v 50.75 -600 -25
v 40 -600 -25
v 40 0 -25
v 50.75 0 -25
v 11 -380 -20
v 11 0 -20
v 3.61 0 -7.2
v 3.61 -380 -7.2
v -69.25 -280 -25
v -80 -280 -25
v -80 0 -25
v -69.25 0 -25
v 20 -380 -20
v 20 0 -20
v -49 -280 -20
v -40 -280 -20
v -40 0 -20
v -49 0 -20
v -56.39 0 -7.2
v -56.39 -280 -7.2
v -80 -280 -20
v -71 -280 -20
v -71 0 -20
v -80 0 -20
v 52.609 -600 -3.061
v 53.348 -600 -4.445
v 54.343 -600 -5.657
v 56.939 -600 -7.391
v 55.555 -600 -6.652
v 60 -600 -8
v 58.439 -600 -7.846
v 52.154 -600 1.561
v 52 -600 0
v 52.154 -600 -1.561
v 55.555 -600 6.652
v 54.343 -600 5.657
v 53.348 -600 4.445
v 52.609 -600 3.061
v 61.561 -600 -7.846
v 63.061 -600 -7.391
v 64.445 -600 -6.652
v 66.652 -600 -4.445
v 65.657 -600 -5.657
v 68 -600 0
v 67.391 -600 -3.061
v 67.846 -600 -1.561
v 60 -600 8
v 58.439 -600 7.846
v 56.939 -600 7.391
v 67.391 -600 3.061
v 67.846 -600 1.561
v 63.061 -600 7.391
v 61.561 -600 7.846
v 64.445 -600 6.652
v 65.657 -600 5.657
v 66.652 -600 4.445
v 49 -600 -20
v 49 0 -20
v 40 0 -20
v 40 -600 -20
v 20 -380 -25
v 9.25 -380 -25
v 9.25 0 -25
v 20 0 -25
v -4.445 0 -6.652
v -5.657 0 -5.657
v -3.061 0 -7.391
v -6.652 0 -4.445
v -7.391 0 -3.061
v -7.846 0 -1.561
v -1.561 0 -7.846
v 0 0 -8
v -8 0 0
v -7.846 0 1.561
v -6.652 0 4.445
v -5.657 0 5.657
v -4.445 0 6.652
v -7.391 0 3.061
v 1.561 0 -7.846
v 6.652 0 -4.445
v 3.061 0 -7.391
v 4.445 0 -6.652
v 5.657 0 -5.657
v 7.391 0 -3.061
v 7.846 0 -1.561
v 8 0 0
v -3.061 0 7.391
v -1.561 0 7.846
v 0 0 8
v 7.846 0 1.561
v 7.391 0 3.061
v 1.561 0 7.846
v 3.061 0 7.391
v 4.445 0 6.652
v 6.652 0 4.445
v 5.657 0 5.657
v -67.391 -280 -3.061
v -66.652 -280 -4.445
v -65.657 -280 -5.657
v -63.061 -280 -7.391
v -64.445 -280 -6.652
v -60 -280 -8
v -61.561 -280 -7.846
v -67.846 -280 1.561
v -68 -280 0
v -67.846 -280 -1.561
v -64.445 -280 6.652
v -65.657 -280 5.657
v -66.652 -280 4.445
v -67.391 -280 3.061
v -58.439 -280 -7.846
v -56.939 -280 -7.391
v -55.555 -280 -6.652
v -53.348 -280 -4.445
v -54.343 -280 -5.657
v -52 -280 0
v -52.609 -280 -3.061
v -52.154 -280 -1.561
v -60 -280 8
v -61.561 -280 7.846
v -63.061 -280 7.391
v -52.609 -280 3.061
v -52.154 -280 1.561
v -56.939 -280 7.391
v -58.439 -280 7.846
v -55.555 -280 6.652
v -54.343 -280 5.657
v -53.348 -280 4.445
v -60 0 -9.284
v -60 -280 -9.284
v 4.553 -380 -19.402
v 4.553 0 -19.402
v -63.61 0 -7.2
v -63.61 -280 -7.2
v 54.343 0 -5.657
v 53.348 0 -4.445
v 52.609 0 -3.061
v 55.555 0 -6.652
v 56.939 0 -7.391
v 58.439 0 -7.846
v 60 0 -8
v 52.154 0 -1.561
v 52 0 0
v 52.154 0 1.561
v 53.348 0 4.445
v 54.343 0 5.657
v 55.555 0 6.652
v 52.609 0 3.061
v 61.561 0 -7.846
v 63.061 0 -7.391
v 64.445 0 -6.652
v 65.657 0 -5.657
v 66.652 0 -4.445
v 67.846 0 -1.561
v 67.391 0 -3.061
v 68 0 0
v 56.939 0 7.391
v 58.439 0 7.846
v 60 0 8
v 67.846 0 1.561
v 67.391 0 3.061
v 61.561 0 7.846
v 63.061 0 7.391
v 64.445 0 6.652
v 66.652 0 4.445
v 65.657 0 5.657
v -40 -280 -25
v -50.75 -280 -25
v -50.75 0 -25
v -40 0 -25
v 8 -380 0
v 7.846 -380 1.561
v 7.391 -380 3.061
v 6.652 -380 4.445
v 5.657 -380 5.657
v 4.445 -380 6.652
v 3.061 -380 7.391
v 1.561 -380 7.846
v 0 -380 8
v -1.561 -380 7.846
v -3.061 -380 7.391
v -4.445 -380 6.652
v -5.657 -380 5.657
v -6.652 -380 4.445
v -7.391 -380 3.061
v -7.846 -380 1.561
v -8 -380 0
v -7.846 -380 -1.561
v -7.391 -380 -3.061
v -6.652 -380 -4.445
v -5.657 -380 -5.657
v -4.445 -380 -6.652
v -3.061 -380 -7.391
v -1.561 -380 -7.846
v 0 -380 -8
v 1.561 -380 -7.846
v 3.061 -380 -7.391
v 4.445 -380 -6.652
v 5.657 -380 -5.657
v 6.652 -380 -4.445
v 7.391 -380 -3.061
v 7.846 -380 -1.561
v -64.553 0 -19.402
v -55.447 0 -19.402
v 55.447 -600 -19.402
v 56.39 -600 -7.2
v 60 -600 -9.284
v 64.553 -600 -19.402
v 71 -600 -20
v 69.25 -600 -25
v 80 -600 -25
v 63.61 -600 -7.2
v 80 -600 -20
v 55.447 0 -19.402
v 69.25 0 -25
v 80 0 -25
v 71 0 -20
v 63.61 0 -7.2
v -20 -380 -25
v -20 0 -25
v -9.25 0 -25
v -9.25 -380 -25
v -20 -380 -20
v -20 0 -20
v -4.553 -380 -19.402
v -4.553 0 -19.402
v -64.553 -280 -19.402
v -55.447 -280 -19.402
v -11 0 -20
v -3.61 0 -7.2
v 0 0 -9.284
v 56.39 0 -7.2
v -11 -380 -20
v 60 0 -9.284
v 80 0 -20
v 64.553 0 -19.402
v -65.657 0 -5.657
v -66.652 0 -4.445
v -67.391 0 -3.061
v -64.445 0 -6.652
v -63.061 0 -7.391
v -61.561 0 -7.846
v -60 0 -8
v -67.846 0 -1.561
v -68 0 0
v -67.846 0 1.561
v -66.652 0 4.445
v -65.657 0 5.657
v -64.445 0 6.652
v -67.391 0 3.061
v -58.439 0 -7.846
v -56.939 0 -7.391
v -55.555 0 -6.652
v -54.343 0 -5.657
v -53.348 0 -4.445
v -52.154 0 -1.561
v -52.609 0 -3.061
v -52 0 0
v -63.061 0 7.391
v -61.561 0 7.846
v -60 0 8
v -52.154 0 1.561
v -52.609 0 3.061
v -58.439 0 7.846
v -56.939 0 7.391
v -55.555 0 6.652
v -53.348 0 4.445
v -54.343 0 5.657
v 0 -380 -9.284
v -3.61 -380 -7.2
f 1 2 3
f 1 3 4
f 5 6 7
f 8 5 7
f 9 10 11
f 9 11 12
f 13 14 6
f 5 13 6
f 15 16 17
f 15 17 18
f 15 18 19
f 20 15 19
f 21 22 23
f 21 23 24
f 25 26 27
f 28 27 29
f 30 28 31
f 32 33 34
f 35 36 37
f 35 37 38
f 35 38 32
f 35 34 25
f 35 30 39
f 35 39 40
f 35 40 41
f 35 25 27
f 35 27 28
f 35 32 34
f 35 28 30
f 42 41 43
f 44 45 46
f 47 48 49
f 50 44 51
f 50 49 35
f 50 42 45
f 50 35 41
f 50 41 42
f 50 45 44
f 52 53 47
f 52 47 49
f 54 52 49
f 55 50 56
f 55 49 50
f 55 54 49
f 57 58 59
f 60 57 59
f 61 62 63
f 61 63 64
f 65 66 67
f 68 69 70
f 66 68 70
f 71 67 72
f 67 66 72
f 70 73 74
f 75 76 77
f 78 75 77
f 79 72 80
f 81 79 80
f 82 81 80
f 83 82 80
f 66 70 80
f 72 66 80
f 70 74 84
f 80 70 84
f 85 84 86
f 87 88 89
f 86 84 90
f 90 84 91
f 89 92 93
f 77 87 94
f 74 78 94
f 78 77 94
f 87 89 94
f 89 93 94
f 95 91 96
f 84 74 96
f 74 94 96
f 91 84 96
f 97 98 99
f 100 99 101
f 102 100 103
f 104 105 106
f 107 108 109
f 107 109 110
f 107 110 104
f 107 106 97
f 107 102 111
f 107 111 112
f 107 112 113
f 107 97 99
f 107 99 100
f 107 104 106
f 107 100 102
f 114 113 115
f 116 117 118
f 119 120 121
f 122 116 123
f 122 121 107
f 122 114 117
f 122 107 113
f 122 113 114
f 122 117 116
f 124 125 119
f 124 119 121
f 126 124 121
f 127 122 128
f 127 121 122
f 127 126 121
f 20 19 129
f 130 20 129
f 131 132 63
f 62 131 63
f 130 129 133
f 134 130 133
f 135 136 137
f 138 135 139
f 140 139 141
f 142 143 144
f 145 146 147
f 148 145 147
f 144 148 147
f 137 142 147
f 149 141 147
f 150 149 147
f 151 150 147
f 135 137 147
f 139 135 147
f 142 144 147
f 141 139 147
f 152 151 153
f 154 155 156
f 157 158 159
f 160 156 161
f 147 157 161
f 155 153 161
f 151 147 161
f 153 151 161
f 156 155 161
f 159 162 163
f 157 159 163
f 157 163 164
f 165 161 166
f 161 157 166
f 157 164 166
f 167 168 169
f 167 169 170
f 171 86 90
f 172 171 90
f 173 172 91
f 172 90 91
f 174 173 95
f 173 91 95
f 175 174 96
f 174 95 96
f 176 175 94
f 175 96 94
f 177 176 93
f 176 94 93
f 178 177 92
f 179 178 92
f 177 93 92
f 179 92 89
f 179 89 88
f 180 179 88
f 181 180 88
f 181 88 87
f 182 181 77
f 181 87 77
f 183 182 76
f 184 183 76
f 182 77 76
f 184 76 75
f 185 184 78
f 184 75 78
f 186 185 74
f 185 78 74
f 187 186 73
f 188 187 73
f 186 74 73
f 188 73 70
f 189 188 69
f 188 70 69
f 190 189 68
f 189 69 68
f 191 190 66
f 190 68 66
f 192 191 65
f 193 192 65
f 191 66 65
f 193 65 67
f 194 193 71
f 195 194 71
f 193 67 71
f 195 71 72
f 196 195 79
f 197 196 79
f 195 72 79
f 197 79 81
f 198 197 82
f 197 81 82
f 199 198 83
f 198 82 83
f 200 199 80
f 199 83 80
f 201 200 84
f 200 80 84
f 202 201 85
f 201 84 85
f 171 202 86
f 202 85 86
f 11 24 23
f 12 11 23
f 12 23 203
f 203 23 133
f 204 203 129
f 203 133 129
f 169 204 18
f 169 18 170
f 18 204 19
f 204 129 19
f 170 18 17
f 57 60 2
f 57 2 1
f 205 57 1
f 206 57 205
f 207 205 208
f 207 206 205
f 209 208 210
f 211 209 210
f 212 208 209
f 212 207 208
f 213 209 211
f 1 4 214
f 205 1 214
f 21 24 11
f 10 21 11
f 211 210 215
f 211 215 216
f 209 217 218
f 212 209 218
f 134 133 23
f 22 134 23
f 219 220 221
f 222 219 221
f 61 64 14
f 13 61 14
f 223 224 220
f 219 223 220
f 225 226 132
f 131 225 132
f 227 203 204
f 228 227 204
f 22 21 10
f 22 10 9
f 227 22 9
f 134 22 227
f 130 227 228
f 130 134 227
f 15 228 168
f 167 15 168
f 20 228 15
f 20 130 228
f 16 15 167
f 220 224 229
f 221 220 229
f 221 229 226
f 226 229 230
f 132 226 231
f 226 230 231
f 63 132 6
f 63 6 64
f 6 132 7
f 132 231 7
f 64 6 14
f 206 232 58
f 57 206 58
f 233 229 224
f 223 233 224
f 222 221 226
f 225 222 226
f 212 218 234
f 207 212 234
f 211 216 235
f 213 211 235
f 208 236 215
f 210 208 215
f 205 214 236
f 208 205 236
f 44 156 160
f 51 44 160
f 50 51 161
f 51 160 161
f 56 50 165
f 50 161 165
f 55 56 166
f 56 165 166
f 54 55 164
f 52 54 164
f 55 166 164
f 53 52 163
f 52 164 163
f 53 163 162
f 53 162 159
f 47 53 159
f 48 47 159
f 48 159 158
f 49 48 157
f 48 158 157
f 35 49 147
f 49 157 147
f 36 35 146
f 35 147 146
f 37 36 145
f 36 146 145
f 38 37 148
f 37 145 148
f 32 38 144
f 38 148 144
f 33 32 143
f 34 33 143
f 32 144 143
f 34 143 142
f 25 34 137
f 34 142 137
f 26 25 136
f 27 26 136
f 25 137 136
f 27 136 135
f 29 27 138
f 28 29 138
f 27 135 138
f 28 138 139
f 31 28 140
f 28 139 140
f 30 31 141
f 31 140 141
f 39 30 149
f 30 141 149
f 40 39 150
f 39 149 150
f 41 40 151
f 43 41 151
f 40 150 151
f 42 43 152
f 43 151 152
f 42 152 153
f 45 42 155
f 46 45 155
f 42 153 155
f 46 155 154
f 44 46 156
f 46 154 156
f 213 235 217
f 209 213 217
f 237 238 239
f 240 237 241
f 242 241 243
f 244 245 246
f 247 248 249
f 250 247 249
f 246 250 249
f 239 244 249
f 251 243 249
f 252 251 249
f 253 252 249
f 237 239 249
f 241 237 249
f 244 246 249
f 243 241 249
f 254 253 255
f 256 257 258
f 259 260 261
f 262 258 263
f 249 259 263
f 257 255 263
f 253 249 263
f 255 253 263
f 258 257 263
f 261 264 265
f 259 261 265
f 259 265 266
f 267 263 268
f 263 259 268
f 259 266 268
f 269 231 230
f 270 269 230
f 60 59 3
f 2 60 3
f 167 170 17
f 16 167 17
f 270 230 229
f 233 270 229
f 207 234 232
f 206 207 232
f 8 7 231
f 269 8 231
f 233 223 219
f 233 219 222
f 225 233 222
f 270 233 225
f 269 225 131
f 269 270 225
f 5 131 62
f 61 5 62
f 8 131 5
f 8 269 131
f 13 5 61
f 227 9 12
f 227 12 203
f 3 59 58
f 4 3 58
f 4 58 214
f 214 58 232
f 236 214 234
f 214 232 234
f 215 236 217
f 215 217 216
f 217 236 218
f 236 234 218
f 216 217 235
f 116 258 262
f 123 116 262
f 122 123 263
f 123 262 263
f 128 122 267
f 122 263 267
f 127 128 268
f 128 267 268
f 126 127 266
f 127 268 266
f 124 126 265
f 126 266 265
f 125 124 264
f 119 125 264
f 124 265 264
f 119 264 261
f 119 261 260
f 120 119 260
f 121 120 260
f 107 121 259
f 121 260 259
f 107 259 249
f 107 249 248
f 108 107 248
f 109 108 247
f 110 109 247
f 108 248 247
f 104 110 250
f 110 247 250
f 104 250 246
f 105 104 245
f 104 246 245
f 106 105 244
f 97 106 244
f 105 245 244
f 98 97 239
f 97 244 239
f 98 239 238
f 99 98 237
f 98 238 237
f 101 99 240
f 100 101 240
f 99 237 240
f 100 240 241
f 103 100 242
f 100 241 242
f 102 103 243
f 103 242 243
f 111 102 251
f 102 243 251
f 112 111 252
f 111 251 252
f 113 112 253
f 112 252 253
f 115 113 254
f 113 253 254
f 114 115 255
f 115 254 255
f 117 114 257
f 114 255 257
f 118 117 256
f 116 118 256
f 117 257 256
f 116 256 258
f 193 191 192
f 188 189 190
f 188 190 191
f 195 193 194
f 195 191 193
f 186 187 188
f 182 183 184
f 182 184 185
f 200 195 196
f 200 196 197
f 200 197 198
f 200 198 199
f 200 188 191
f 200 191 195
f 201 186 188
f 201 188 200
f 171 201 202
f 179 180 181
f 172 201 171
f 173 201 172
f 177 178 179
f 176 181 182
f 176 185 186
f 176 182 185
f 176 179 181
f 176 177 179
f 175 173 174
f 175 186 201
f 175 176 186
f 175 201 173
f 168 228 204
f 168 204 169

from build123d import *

# Parameters (mm, degrees)
F0_R     = 8
F1_DEPTH = 380
F2_DEPTH = 600
F3_DEPTH = 280


with BuildPart() as f1:
    # F0 (on Front) → F1 (new body)
    with BuildSketch(Plane.XZ):
        Circle(F0_R)
        Polygon((9.25, -25), (20, -25), (20, -20), (11, -20), (3.609917, -7.2), (0, -9.284186), (-3.609917, -7.2), (-11, -20), (-20, -20), (-20, -25), (-9.25, -25), (-4.55264, -19.401904), (4.55264, -19.401904), align=None)
    extrude(amount=F1_DEPTH)


with BuildPart() as f2:
    # F0 (on Front) → F2 (new body)
    with BuildSketch(Plane.XZ):
        with Locations((60, 0)):
            Circle(F0_R)
        Polygon((69.25, -25), (80, -25), (80, -20), (71, -20), (63.609917, -7.2), (60, -9.284186), (56.390083, -7.2), (49, -20), (40, -20), (40, -25), (50.75, -25), (55.44736, -19.401904), (64.55264, -19.401904), align=None)
    extrude(amount=F2_DEPTH)


with BuildPart() as f3:
    # F0 (on Front) → F3 (new body)
    with BuildSketch(Plane.XZ):
        with Locations((-60, 0)):
            Circle(F0_R)
        Polygon((-50.75, -25), (-40, -25), (-40, -20), (-49, -20), (-56.390083, -7.2), (-60, -9.284186), (-63.609917, -7.2), (-71, -20), (-80, -20), (-80, -25), (-69.25, -25), (-64.55264, -19.401904), (-55.44736, -19.401904), align=None)
    extrude(amount=F3_DEPTH)


solid = Compound([f1.part, f2.part, f3.part])
